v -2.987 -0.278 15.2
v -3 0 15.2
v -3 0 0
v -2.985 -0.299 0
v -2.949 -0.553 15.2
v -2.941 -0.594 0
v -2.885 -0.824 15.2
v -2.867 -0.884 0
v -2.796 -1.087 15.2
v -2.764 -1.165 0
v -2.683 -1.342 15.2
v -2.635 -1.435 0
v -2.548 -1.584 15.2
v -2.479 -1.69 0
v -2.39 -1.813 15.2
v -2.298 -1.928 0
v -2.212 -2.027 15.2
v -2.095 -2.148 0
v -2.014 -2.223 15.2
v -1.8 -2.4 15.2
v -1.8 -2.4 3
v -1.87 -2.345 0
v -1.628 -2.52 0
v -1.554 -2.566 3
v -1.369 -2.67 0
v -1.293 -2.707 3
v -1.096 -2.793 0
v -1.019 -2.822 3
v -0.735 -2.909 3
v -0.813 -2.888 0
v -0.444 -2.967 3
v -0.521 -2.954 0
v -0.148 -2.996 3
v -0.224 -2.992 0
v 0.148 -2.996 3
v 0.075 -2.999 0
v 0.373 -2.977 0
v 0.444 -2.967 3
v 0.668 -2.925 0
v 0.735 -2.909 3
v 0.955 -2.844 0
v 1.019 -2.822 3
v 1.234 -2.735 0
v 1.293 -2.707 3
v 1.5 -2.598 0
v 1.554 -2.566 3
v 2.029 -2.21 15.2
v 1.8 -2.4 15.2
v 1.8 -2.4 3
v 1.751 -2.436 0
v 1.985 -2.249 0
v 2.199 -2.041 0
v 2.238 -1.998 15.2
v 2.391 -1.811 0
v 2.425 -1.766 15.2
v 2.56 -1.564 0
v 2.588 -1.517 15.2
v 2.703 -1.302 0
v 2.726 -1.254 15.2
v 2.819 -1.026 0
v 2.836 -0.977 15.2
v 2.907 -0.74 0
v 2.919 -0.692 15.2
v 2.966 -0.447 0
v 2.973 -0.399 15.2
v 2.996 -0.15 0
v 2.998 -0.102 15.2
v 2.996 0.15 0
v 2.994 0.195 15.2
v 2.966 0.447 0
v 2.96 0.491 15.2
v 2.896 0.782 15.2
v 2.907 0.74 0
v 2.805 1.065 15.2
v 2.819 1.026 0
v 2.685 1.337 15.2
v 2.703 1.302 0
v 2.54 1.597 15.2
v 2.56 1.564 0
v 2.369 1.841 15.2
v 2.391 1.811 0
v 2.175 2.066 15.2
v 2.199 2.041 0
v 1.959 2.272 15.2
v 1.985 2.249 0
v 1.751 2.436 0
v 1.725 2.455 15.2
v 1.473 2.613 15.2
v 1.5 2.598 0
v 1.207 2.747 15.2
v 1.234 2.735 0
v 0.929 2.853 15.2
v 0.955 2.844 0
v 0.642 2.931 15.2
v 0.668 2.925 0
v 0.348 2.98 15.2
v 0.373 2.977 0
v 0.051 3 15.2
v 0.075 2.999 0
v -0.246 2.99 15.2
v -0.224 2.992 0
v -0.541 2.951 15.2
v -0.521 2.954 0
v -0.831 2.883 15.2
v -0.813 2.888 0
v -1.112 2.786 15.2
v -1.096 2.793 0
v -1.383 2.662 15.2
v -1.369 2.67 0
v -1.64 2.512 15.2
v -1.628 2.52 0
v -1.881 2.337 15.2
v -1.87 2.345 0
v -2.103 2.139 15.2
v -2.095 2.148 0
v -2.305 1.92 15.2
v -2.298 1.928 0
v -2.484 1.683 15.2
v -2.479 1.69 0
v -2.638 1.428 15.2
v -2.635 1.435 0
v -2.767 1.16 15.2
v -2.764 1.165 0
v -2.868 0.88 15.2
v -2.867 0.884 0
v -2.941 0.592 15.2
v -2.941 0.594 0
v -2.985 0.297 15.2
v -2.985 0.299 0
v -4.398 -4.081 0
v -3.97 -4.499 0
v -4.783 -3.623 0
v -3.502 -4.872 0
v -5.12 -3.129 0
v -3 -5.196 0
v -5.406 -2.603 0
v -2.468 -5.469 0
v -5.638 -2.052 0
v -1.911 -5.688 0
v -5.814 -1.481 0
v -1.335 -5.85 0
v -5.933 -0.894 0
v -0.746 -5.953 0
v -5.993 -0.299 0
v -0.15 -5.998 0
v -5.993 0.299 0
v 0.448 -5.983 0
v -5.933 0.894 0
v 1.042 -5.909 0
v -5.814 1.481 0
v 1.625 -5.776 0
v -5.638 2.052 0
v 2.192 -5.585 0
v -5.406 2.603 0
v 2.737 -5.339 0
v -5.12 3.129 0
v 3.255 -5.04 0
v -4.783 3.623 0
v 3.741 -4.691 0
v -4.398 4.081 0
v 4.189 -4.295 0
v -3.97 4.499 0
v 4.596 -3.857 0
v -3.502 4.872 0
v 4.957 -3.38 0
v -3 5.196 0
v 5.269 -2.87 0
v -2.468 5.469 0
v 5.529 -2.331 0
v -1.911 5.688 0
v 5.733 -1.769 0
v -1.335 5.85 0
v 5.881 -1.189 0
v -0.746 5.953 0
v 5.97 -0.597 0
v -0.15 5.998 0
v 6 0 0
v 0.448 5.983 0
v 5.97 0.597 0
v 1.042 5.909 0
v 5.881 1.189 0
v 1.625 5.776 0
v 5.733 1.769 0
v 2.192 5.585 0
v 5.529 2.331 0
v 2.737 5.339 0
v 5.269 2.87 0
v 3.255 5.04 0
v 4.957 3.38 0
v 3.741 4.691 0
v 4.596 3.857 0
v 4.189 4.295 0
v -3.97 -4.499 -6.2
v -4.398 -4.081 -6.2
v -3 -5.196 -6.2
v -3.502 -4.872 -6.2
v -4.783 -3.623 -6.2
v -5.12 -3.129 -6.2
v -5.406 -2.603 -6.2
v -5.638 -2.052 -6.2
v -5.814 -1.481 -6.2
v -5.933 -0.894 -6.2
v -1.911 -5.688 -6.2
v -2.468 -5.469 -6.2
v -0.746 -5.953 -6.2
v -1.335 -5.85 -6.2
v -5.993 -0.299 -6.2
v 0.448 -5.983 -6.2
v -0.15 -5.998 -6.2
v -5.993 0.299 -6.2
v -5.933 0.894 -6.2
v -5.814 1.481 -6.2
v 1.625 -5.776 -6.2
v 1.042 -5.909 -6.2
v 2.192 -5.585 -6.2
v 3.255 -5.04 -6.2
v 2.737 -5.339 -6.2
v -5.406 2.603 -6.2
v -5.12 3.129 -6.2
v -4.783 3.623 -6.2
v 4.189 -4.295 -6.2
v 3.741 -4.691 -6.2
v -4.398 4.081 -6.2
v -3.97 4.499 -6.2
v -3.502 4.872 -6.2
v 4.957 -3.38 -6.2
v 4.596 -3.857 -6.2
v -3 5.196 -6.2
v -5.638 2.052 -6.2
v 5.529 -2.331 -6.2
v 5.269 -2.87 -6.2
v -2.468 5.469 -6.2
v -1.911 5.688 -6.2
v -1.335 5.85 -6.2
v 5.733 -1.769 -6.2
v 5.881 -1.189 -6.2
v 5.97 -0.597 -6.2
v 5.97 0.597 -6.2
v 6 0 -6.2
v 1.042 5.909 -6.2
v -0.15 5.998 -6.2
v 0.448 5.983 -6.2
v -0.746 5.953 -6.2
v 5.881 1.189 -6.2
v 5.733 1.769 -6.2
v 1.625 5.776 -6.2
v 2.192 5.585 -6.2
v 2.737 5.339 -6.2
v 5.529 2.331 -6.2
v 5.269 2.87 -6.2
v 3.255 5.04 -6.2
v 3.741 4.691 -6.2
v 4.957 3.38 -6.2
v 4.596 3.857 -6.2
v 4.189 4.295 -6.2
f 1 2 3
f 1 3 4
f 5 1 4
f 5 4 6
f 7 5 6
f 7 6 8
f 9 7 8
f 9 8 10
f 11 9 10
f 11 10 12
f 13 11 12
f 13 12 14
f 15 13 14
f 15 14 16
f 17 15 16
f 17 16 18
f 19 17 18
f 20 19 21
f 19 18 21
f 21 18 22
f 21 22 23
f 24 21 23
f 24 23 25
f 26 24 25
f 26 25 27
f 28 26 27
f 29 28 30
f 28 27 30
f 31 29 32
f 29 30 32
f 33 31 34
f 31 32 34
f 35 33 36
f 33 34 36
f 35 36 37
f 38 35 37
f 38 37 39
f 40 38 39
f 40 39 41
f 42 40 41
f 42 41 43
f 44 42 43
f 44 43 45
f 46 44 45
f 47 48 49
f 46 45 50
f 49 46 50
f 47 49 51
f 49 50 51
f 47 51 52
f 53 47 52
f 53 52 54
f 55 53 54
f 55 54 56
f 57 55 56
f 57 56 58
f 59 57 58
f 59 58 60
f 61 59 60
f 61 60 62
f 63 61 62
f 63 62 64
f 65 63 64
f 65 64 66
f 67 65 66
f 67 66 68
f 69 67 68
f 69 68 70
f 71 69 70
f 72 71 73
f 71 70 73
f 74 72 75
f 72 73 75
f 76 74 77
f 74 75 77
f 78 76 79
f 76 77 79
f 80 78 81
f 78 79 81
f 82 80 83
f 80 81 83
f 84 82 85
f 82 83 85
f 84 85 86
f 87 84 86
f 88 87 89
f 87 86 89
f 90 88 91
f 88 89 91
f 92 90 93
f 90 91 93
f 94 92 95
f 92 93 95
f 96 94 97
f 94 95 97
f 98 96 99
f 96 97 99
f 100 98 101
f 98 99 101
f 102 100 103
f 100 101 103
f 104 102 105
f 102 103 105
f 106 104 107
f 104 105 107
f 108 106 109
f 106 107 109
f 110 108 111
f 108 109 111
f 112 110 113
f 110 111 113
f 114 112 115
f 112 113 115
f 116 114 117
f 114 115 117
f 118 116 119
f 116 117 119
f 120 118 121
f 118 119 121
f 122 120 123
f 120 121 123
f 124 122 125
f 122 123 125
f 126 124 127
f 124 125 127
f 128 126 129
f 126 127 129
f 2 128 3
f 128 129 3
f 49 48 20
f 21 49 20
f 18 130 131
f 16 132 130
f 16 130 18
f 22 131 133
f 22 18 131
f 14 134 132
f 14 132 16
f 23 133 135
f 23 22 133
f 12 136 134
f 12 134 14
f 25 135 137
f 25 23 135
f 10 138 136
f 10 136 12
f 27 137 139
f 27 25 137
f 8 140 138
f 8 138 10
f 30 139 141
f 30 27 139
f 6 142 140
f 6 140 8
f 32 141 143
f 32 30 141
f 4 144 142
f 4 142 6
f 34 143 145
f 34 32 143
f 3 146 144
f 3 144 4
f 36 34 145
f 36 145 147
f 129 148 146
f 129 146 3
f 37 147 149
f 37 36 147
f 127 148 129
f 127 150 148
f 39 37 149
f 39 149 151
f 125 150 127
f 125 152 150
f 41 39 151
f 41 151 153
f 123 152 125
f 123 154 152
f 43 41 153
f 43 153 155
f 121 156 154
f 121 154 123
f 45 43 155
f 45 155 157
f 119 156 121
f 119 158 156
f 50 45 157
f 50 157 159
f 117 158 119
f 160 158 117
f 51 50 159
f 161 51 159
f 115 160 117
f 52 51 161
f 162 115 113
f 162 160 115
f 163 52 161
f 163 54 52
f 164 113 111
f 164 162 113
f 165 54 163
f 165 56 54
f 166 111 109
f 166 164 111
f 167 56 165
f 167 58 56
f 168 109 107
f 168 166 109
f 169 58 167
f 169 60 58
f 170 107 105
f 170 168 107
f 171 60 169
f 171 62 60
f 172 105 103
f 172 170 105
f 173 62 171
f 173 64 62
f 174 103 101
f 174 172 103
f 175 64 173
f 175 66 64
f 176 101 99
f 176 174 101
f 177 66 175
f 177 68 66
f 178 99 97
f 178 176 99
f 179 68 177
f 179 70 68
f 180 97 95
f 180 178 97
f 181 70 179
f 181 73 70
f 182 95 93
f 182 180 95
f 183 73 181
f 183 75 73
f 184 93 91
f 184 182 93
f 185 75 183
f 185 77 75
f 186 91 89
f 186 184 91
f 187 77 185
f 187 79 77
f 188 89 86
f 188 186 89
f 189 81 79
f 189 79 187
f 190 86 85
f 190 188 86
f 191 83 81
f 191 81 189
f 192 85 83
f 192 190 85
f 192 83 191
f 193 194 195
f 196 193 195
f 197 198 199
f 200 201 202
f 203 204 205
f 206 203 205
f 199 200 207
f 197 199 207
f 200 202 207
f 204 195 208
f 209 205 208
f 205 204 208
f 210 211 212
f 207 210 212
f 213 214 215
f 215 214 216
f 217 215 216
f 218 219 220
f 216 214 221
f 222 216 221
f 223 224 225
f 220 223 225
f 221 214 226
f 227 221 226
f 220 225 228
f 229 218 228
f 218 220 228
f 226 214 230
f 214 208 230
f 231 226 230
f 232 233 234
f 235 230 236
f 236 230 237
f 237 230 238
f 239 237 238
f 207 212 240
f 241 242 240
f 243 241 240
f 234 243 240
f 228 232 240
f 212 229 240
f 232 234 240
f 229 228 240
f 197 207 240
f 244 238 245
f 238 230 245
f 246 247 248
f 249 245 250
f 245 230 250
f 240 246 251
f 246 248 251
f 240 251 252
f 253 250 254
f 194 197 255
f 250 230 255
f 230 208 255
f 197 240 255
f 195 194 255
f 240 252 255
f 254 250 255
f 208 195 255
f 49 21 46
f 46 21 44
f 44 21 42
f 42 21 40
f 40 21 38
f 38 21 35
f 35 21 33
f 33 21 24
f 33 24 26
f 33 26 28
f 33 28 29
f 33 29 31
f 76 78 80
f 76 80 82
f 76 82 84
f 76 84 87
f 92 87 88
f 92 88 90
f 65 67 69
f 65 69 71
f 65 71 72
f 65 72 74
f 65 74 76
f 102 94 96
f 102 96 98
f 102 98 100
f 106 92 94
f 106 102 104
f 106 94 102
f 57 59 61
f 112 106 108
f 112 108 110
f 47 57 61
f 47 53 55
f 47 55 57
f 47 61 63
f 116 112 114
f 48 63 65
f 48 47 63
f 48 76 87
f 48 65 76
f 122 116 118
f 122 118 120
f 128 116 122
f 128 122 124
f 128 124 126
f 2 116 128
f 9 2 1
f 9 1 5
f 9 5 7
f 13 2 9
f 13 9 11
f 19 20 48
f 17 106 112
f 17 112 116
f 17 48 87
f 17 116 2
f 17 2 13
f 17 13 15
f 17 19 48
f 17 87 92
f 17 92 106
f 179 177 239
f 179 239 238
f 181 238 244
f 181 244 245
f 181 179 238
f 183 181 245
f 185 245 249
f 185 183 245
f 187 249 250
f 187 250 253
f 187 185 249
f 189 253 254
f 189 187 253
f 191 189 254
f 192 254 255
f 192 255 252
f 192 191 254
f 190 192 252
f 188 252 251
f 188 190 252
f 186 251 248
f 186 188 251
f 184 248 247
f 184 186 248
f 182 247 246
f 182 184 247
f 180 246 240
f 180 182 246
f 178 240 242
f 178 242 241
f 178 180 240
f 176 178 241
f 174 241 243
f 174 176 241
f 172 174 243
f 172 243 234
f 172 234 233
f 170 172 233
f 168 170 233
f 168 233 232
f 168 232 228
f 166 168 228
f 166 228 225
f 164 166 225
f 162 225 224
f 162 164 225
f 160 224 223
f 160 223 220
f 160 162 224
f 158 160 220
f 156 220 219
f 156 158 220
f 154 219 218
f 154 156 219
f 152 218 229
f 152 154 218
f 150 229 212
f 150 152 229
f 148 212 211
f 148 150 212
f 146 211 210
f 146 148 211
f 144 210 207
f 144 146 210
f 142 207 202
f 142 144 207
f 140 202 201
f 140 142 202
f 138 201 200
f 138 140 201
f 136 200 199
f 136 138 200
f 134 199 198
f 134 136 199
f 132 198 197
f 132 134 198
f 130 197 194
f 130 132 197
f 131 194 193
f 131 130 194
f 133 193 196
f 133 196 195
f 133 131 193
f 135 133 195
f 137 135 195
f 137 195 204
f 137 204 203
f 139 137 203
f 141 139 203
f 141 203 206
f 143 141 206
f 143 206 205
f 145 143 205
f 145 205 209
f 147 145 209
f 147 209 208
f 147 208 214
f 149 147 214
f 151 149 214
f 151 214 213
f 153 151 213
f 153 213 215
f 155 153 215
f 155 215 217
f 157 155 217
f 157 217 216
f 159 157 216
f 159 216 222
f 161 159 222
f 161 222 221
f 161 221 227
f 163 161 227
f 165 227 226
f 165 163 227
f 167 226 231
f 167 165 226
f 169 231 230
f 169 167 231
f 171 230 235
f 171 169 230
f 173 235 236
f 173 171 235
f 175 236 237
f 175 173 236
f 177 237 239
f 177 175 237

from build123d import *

# Parameters (mm, degrees)
CROQUIS2_R                 = 6
SALIENTE_EXTRUIR1_DEPTH    = 6.2
CROQUIS3_R                 = 3
SALIENTE_EXTRUIR2_DEPTH    = 15.2
CORTAR_EXTRUIR1_DEPTH      = 24.020860106
CORTAR_EXTRUIR1_DEPTH_BACK = 12.2


with BuildPart() as part:
    # Croquis2 → Saliente-Extruir1 (new body)
    with BuildSketch(Plane.XY):
        Circle(CROQUIS2_R)
    extrude(amount=-SALIENTE_EXTRUIR1_DEPTH)

    # Croquis3 → Saliente-Extruir2 (add)
    with BuildSketch(Plane.XY):
        with Locations(Location((0, 0, 0), (0, 0, 180))):
            Circle(CROQUIS3_R)
    extrude(amount=SALIENTE_EXTRUIR2_DEPTH)

    # Croquis4 → Cortar-Extruir1 (cut, two sides: drawn at the far end of the back side and taken through both)
    with BuildSketch(Plane.XY.offset(15.2).offset(-CORTAR_EXTRUIR1_DEPTH_BACK)):
        Polygon((34.725967809, -2.4), (1.8, -2.4), (-1.8, -2.4), (-34.725967809, -2.4), (-34.725967809, -68.251935619), (34.725967809, -68.251935619), align=None)
    extrude(amount=CORTAR_EXTRUIR1_DEPTH + CORTAR_EXTRUIR1_DEPTH_BACK, mode=Mode.SUBTRACT)


solid = part.part
